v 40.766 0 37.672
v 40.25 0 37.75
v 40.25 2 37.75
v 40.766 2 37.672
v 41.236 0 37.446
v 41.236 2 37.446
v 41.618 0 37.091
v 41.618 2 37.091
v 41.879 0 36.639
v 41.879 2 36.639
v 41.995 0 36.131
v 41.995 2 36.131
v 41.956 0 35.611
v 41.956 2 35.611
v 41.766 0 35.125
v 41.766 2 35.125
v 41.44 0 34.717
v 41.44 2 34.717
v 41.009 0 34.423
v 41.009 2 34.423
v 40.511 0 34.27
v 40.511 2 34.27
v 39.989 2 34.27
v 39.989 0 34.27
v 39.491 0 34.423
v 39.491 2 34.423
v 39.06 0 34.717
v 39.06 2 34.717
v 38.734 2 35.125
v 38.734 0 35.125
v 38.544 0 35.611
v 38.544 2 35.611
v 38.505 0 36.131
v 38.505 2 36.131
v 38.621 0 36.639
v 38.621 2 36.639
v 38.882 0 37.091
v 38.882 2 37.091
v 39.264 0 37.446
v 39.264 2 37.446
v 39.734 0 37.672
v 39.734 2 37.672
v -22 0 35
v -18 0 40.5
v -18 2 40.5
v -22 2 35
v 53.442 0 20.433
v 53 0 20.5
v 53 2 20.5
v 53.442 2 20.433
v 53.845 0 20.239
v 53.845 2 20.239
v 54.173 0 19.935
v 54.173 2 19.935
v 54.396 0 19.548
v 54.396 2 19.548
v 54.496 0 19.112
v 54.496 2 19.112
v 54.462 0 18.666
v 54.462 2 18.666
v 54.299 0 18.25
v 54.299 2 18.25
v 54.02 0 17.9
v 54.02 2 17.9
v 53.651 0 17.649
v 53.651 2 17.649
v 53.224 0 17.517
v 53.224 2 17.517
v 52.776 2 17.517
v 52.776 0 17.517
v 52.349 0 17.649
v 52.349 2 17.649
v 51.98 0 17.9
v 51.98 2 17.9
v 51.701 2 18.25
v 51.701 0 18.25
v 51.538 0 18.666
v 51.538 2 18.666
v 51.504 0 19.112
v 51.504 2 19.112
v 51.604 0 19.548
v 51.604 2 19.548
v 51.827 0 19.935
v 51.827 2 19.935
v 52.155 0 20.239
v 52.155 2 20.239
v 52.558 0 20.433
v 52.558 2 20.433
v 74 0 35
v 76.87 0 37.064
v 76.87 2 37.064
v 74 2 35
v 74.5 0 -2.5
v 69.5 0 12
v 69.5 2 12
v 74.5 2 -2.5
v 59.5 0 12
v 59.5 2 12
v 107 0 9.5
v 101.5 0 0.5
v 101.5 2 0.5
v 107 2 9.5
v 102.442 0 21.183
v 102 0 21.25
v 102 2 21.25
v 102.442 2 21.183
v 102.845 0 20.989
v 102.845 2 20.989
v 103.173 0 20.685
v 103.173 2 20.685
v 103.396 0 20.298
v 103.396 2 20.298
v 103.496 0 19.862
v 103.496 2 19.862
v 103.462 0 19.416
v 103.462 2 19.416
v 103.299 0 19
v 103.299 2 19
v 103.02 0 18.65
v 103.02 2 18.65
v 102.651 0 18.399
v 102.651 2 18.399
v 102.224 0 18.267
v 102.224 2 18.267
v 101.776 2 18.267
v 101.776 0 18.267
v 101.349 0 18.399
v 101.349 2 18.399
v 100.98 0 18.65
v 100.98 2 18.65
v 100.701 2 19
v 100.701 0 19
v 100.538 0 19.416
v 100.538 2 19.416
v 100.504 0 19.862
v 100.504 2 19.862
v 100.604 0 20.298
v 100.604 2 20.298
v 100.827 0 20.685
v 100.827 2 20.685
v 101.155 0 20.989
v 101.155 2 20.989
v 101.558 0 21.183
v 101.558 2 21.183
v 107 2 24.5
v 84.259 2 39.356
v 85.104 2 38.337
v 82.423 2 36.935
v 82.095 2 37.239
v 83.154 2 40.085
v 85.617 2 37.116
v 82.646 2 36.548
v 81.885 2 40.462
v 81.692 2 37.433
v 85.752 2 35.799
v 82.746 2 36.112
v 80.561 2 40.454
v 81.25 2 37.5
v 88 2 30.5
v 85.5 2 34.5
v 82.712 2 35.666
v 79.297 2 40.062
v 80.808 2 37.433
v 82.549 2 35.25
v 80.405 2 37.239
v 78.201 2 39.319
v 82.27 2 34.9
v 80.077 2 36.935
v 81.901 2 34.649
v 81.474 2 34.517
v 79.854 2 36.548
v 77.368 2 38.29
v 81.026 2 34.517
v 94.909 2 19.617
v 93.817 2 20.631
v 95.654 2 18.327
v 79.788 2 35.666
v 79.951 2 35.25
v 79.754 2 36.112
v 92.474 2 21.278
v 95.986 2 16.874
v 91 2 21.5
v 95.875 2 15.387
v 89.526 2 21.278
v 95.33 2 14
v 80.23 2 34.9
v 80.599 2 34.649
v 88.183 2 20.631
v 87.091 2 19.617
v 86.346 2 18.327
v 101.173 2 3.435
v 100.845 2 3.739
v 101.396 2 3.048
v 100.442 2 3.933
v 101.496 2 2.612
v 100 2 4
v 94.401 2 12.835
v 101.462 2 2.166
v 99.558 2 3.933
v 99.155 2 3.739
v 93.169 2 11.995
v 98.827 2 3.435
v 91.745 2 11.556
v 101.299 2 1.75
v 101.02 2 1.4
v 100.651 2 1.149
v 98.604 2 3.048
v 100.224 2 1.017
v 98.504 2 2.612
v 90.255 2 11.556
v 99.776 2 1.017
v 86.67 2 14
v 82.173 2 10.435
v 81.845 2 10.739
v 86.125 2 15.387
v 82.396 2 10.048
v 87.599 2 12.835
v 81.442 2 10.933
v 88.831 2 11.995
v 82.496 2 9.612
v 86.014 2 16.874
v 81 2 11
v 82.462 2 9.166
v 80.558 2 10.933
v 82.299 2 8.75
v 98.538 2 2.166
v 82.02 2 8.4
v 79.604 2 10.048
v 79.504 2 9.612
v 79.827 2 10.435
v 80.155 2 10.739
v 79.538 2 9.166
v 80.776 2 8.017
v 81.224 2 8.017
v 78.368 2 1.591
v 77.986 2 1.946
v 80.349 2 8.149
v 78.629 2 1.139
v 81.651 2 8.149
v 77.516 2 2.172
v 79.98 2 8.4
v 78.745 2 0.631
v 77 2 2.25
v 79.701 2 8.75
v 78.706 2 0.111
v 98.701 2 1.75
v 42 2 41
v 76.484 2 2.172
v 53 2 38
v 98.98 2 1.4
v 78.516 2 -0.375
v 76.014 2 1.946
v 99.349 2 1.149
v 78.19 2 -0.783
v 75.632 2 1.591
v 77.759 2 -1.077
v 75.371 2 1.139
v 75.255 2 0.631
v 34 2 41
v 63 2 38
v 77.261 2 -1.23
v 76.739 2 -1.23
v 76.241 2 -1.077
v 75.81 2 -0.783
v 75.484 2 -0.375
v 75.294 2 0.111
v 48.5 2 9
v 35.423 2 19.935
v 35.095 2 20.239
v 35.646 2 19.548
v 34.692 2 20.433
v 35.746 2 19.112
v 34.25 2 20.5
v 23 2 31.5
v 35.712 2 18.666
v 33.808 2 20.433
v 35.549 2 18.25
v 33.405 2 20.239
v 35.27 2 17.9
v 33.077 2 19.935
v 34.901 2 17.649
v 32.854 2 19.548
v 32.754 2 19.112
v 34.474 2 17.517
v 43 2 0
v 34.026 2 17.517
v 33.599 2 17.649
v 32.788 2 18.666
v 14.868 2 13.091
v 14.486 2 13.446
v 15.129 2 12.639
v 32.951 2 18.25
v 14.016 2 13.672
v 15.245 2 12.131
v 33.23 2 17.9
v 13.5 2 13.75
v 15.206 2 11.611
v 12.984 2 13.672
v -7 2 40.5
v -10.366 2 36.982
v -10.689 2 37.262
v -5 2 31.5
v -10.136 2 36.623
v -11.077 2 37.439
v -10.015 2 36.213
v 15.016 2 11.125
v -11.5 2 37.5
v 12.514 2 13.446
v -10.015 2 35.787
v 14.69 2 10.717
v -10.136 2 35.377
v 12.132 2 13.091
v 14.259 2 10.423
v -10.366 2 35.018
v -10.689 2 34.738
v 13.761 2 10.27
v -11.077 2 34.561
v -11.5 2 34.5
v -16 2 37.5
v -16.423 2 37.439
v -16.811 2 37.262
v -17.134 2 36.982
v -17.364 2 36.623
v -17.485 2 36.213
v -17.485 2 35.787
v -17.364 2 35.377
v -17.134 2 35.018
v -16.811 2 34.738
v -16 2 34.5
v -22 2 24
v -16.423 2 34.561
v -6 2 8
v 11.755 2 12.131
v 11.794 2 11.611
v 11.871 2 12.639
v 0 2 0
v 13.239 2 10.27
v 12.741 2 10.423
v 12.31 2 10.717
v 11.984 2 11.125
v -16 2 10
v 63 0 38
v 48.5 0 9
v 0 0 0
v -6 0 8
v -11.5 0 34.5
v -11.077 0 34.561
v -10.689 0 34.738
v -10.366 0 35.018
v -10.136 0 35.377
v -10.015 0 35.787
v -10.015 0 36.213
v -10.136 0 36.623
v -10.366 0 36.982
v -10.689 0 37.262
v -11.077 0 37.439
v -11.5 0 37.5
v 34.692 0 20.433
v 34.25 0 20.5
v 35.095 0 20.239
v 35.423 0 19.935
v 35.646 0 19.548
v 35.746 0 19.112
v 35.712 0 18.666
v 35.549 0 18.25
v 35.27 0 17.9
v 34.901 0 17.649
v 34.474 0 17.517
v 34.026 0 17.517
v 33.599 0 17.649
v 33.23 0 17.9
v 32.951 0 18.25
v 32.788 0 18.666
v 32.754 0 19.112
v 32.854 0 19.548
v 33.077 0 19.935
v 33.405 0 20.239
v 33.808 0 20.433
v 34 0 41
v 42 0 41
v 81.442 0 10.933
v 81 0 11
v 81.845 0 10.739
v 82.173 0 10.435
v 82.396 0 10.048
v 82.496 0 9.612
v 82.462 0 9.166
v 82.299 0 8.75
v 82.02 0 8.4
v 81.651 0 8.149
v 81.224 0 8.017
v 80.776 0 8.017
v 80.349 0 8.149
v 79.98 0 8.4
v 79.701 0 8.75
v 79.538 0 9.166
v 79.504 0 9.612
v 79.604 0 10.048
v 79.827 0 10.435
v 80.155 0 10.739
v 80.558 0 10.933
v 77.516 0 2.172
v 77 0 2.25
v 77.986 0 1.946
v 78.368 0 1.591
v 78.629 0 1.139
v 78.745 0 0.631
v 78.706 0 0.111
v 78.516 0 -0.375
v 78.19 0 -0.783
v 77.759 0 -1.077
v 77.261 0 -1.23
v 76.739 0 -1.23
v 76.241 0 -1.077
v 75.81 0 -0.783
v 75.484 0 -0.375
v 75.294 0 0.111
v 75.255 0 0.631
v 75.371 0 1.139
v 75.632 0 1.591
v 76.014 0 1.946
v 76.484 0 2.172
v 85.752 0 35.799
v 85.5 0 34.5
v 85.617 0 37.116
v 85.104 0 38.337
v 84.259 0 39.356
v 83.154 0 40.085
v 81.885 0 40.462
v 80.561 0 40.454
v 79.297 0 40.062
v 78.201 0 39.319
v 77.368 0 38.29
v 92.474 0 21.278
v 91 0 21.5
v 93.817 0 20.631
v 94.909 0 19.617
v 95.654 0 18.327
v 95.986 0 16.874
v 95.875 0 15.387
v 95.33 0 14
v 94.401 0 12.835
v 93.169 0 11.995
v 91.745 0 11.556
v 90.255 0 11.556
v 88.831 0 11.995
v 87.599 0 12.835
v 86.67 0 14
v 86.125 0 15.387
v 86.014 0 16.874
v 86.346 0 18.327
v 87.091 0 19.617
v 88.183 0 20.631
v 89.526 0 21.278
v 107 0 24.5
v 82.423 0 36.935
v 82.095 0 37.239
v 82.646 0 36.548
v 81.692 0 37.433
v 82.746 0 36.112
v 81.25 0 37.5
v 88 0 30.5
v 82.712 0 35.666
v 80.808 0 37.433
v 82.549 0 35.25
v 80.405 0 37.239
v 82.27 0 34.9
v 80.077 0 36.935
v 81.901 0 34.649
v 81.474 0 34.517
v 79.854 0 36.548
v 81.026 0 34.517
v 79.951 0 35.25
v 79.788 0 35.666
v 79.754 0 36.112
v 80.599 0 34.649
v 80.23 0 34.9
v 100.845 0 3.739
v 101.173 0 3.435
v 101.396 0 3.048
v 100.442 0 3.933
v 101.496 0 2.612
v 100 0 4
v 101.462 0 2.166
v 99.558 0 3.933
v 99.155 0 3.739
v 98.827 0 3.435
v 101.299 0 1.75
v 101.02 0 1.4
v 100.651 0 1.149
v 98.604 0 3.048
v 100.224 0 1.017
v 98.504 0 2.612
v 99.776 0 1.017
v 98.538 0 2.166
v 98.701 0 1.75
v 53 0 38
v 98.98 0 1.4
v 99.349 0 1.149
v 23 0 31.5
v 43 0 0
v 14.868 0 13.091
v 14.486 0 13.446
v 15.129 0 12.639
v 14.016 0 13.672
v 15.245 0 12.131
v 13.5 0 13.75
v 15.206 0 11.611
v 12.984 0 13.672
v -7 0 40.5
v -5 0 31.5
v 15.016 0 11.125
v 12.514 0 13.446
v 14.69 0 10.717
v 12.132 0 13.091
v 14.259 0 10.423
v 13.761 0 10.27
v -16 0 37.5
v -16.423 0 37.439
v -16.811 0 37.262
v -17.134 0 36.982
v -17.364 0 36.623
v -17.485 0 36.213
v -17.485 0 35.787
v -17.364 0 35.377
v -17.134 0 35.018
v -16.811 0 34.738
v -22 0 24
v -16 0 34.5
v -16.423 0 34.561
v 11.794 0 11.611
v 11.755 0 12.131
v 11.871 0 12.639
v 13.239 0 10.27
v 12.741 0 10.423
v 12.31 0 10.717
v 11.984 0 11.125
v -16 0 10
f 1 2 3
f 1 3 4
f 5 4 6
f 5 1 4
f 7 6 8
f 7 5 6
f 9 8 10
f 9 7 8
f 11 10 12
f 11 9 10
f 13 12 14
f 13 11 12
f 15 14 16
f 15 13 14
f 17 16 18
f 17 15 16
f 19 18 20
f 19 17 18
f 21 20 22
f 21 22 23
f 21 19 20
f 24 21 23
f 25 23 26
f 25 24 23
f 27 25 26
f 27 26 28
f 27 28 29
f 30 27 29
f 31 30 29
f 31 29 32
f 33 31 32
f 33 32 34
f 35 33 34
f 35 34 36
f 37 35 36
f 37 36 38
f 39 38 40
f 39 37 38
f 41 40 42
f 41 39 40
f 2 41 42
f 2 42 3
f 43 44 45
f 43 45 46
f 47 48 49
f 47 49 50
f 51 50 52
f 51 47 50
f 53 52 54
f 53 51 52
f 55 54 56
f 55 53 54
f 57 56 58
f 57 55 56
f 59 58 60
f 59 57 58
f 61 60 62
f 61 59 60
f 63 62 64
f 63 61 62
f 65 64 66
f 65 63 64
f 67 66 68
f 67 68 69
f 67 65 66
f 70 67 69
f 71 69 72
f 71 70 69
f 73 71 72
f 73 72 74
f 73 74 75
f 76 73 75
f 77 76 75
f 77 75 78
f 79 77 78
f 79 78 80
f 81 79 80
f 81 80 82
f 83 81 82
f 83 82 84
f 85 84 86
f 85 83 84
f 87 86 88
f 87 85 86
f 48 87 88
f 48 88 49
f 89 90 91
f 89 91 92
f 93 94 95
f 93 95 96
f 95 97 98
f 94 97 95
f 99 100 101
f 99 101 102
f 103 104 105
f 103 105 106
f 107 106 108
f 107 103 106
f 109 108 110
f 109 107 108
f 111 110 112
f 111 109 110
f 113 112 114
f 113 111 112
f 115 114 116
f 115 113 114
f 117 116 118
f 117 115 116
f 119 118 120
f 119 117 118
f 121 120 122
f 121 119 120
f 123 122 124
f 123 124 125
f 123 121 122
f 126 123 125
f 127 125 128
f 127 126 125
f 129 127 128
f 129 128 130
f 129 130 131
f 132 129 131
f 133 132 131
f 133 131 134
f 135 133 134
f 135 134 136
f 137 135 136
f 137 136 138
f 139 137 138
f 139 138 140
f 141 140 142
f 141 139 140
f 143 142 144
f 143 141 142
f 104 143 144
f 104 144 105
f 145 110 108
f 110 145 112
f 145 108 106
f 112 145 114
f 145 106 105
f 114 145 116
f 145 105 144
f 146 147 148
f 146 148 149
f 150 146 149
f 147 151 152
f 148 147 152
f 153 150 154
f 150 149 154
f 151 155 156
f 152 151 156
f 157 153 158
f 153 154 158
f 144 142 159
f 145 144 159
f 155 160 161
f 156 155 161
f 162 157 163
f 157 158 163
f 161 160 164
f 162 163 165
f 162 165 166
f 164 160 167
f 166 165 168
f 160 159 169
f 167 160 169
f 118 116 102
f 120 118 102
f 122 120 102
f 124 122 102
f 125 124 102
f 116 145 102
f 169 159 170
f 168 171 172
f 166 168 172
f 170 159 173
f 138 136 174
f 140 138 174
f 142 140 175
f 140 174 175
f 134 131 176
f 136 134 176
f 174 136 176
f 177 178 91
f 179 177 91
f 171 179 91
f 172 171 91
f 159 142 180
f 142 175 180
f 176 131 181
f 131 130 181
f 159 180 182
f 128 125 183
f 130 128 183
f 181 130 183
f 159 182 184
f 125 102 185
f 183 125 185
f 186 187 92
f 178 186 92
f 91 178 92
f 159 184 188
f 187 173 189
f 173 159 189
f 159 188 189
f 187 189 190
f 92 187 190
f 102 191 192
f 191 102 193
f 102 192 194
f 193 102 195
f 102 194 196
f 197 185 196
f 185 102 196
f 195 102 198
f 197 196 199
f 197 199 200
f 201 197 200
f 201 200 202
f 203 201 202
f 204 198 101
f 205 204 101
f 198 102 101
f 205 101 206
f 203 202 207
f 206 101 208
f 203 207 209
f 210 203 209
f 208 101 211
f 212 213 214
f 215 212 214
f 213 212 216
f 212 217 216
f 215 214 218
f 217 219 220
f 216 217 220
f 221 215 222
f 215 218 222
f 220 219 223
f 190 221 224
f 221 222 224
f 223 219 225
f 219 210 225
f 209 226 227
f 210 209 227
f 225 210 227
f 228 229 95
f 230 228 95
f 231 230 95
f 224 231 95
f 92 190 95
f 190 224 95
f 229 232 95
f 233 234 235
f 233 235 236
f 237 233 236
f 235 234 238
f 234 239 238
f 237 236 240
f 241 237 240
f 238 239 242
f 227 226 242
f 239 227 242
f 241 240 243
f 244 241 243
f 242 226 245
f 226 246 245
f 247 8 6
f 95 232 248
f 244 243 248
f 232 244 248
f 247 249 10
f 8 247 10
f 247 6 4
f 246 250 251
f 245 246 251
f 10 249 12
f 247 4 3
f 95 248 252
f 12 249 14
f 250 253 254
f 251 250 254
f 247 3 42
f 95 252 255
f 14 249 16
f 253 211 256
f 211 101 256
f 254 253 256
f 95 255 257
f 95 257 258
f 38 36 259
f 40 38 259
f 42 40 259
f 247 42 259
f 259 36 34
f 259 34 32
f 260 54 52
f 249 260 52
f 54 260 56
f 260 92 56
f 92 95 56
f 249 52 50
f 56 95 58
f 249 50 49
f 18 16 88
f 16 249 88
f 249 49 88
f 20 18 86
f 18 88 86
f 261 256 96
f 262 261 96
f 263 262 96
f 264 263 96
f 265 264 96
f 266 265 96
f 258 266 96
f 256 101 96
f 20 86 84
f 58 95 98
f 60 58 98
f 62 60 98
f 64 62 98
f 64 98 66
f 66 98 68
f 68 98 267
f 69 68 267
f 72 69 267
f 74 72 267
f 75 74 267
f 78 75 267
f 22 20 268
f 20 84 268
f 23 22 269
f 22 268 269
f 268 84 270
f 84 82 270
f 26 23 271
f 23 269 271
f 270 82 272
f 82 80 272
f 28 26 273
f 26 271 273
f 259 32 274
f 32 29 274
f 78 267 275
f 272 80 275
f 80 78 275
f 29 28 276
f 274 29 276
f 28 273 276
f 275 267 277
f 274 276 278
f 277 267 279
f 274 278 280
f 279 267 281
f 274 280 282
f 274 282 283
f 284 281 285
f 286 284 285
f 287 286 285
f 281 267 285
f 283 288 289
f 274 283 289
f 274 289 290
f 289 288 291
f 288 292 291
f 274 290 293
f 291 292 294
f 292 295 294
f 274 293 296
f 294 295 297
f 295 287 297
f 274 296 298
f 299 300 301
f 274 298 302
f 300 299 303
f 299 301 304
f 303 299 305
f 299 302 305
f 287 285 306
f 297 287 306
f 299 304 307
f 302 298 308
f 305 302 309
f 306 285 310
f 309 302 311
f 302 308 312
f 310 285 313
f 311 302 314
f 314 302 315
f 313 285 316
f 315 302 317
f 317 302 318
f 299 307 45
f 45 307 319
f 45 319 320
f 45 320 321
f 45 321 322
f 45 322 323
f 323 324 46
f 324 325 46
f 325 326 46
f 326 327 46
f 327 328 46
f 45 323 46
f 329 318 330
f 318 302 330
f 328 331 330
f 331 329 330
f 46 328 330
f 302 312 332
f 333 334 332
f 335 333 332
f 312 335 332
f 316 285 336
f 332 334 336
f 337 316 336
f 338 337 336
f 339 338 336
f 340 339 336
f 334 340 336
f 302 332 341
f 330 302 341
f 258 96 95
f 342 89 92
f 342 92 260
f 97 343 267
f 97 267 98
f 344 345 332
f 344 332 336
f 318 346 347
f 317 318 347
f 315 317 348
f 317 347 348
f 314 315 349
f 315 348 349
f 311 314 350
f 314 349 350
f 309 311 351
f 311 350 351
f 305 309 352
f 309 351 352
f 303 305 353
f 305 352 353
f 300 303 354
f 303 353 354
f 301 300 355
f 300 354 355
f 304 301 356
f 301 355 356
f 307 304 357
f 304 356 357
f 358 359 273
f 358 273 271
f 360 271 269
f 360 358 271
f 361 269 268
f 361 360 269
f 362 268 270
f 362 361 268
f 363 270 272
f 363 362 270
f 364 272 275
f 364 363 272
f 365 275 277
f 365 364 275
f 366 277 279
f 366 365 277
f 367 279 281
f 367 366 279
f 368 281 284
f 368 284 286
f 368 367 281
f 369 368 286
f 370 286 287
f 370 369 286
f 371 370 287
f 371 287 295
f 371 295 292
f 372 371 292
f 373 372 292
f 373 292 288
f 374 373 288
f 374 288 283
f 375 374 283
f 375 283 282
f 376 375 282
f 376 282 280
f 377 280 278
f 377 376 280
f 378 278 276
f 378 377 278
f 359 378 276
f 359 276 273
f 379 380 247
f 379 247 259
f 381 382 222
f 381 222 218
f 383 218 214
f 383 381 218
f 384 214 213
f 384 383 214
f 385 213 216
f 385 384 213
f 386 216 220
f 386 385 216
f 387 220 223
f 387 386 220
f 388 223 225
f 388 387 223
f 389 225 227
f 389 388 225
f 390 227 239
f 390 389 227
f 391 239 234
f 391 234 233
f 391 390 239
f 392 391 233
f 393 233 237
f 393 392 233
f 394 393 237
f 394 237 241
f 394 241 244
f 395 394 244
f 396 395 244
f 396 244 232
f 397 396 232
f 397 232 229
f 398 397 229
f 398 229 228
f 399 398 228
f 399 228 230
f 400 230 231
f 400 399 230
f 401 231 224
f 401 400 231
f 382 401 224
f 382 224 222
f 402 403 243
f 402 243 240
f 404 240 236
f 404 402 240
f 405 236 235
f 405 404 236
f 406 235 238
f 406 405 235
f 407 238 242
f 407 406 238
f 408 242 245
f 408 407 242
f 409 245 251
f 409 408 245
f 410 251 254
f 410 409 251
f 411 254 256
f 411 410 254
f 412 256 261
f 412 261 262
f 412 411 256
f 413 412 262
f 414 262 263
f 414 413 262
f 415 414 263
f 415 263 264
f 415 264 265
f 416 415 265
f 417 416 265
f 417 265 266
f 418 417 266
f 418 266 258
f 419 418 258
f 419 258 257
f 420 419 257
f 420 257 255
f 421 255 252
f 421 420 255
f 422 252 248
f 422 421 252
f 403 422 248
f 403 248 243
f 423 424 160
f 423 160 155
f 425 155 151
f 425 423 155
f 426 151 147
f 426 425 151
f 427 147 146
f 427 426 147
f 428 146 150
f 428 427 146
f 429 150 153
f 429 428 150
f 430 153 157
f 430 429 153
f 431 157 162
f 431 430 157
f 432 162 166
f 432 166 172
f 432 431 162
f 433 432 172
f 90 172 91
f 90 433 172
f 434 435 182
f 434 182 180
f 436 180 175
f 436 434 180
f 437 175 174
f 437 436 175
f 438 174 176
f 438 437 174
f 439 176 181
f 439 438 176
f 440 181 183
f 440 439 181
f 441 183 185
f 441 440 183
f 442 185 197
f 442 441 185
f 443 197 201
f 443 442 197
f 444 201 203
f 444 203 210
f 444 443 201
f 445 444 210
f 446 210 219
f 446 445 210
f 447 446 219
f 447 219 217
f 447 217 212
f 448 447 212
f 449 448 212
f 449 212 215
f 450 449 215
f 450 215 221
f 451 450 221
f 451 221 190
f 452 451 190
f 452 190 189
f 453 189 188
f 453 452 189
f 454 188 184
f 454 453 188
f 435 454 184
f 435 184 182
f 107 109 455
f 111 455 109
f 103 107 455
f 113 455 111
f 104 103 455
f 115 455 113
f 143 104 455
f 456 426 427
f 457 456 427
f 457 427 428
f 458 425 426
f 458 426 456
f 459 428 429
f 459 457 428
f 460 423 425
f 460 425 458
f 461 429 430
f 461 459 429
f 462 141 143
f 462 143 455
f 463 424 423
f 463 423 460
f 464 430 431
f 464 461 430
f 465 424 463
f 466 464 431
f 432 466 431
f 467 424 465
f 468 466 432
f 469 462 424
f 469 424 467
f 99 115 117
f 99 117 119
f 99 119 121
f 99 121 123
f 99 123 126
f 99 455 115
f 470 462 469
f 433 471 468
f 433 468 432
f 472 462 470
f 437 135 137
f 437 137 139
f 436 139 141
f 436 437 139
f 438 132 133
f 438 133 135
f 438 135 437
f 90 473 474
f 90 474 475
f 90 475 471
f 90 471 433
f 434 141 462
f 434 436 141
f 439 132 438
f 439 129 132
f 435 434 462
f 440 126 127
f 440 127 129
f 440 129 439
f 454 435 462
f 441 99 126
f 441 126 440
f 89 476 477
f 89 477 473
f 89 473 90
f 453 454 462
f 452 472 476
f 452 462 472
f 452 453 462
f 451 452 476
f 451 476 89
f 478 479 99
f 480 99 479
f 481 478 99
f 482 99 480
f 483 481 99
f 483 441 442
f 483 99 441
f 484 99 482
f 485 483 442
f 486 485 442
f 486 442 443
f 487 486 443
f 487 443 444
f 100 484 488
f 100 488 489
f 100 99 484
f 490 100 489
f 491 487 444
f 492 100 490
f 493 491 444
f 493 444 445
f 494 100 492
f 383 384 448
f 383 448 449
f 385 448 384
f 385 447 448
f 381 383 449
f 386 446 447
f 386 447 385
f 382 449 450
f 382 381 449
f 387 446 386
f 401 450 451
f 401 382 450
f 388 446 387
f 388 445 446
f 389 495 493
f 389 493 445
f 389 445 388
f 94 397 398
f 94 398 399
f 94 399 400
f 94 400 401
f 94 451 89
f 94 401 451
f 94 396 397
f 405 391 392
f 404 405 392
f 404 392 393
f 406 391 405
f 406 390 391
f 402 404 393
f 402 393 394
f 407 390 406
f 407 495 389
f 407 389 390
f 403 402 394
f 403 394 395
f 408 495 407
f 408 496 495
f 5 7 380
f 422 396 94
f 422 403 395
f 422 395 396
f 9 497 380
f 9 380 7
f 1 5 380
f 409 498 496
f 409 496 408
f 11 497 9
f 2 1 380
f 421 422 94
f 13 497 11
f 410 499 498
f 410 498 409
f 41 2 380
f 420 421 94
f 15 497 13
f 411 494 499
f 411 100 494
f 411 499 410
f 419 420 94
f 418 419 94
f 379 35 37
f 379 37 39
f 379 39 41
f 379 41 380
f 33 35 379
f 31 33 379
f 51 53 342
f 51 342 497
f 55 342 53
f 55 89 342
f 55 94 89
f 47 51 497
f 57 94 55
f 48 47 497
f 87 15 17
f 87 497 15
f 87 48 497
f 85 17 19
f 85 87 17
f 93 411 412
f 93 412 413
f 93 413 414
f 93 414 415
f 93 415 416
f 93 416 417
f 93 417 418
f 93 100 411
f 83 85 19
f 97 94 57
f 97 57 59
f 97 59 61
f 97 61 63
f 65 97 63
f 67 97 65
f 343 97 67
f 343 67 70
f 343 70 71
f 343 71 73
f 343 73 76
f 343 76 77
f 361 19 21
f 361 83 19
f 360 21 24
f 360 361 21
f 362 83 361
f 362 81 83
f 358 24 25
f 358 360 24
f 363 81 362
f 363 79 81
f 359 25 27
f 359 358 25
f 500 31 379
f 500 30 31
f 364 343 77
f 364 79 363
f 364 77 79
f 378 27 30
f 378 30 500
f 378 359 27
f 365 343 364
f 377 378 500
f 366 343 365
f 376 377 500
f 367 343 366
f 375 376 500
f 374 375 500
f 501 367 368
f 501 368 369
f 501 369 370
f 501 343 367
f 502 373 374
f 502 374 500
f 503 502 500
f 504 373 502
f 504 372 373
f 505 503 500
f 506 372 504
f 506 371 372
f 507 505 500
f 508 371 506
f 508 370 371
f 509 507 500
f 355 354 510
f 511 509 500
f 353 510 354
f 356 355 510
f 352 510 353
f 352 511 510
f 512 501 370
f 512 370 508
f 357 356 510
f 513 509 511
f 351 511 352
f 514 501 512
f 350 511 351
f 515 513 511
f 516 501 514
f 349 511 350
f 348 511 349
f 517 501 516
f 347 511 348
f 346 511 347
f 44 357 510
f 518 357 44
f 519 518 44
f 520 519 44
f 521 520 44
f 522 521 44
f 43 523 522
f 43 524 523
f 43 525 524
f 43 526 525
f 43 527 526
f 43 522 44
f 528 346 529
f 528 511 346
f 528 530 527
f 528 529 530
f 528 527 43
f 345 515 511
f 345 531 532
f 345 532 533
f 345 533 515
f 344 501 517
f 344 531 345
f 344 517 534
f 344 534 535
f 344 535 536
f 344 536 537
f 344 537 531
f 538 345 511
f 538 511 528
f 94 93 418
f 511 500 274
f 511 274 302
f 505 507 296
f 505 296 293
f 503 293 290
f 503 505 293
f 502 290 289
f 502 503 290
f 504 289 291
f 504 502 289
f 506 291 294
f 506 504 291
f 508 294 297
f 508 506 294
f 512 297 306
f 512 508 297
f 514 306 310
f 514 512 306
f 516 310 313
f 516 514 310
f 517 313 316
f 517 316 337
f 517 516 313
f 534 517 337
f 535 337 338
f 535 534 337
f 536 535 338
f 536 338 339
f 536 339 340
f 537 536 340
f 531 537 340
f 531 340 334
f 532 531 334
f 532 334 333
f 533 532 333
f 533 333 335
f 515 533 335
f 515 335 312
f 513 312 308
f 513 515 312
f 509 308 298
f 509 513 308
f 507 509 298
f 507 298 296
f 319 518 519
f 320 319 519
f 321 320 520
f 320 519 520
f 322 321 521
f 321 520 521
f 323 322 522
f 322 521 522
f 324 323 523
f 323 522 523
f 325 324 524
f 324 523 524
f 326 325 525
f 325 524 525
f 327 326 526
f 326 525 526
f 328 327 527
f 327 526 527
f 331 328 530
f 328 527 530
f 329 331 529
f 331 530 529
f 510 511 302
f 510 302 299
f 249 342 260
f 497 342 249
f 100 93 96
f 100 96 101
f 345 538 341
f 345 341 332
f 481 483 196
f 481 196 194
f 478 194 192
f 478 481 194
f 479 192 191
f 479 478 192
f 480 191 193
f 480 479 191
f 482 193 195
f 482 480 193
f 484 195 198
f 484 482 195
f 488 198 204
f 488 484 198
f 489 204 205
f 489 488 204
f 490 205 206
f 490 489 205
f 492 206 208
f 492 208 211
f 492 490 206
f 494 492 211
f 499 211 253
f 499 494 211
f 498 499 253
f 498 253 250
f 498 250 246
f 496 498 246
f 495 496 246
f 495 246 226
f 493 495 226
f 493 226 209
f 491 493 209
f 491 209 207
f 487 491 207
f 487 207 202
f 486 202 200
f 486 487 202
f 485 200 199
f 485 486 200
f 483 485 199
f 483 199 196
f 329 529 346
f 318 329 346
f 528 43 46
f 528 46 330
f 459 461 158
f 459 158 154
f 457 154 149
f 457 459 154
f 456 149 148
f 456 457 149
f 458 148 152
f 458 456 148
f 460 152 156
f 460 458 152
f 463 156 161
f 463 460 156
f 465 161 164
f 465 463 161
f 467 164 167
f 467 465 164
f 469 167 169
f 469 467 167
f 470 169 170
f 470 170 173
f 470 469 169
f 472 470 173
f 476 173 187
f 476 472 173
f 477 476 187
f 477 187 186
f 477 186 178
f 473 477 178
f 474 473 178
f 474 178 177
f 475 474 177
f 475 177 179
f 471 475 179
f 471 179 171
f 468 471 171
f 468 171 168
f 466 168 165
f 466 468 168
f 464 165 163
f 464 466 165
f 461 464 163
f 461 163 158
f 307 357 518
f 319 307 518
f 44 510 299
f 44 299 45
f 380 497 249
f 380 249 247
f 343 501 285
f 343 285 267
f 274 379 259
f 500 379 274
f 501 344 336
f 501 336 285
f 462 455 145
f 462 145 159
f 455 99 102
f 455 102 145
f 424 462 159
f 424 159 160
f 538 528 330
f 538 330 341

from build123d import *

# Parameters (mm, degrees)
SKETCH1_R           = 1.75
SKETCH1_R_2         = 1.5
SKETCH1_R_3         = 5
BOSS_EXTRUDE1_DEPTH = 2


with BuildPart() as part:
    # Sketch1 → Boss-Extrude1 (new body)
    with BuildSketch(Plane(origin=(0, 0, 0), x_dir=(1, 0, 0), z_dir=(0, 1, 0))):
        with BuildLine():
            Line((0, 0), (43, 0))
            Line((43, 0), (48.5, -9))
            Line((48.5, -9), (59.5, -12))
            Line((59.5, -12), (69.5, -12))
            Line((69.5, -12), (74.5, 2.5))
            Line((74.5, 2.5), (101.5, -0.5))
            Line((101.5, -0.5), (107, -9.5))
            Line((107, -9.5), (107, -24.5))
            Line((107, -24.5), (88, -30.5))
            Line((88, -30.5), (85.5, -34.5))
            ThreePointArc((85.5, -34.5), (82.533474843, -40.320323174), (76.870377201, -37.063674828))
            Line((76.870377201, -37.063674828), (74, -35))
            Line((74, -35), (63, -38))
            Line((63, -38), (53, -38))
            Line((53, -38), (42, -41))
            Line((42, -41), (34, -41))
            Line((34, -41), (23, -31.5))
            Line((23, -31.5), (-5, -31.5))
            Line((-5, -31.5), (-7, -40.5))
            Line((-7, -40.5), (-18, -40.5))
            Line((-18, -40.5), (-22, -35))
            Line((-22, -35), (-22, -24))
            Line((-22, -24), (-16, -10))
            Line((-16, -10), (-6, -8))
            Line((-6, -8), (0, 0))
        make_face()
        with Locations(Location((40.25, -36, 0), (0, 0, 270))):
            Circle(SKETCH1_R, mode=Mode.SUBTRACT)
        with Locations(Location((81.25, -36, 0), (0, 0, 270))):
            Circle(SKETCH1_R_2, mode=Mode.SUBTRACT)
        with Locations(Location((91, -16.5, 0), (0, 0, 270))):
            Circle(SKETCH1_R_3, mode=Mode.SUBTRACT)
        with Locations(Location((77, -0.5, 0), (0, 0, 270))):
            Circle(SKETCH1_R, mode=Mode.SUBTRACT)
        with Locations(Location((81, -9.5, 0), (0, 0, 270))):
            Circle(SKETCH1_R_2, mode=Mode.SUBTRACT)
        with Locations(Location((100, -2.5, 0), (0, 0, 270))):
            Circle(SKETCH1_R_2, mode=Mode.SUBTRACT)
        with Locations(Location((102, -19.75, 0), (0, 0, 270))):
            Circle(SKETCH1_R_2, mode=Mode.SUBTRACT)
        with Locations(Location((53, -19, 0), (0, 0, 270))):
            Circle(SKETCH1_R_2, mode=Mode.SUBTRACT)
        with Locations(Location((34.25, -19, 0), (0, 0, 270))):
            Circle(SKETCH1_R_2, mode=Mode.SUBTRACT)
        with Locations(Location((13.5, -12, 0), (0, 0, 270))):
            Circle(SKETCH1_R, mode=Mode.SUBTRACT)
        with BuildLine():
            Line((-16, -34.5), (-11.5, -34.5))
            ThreePointArc((-11.5, -34.5), (-10, -36), (-11.5, -37.5))
            Line((-11.5, -37.5), (-16, -37.5))
            ThreePointArc((-16, -37.5), (-17.5, -36), (-16, -34.5))
        make_face(mode=Mode.SUBTRACT)
    extrude(amount=BOSS_EXTRUDE1_DEPTH)


solid = part.part
